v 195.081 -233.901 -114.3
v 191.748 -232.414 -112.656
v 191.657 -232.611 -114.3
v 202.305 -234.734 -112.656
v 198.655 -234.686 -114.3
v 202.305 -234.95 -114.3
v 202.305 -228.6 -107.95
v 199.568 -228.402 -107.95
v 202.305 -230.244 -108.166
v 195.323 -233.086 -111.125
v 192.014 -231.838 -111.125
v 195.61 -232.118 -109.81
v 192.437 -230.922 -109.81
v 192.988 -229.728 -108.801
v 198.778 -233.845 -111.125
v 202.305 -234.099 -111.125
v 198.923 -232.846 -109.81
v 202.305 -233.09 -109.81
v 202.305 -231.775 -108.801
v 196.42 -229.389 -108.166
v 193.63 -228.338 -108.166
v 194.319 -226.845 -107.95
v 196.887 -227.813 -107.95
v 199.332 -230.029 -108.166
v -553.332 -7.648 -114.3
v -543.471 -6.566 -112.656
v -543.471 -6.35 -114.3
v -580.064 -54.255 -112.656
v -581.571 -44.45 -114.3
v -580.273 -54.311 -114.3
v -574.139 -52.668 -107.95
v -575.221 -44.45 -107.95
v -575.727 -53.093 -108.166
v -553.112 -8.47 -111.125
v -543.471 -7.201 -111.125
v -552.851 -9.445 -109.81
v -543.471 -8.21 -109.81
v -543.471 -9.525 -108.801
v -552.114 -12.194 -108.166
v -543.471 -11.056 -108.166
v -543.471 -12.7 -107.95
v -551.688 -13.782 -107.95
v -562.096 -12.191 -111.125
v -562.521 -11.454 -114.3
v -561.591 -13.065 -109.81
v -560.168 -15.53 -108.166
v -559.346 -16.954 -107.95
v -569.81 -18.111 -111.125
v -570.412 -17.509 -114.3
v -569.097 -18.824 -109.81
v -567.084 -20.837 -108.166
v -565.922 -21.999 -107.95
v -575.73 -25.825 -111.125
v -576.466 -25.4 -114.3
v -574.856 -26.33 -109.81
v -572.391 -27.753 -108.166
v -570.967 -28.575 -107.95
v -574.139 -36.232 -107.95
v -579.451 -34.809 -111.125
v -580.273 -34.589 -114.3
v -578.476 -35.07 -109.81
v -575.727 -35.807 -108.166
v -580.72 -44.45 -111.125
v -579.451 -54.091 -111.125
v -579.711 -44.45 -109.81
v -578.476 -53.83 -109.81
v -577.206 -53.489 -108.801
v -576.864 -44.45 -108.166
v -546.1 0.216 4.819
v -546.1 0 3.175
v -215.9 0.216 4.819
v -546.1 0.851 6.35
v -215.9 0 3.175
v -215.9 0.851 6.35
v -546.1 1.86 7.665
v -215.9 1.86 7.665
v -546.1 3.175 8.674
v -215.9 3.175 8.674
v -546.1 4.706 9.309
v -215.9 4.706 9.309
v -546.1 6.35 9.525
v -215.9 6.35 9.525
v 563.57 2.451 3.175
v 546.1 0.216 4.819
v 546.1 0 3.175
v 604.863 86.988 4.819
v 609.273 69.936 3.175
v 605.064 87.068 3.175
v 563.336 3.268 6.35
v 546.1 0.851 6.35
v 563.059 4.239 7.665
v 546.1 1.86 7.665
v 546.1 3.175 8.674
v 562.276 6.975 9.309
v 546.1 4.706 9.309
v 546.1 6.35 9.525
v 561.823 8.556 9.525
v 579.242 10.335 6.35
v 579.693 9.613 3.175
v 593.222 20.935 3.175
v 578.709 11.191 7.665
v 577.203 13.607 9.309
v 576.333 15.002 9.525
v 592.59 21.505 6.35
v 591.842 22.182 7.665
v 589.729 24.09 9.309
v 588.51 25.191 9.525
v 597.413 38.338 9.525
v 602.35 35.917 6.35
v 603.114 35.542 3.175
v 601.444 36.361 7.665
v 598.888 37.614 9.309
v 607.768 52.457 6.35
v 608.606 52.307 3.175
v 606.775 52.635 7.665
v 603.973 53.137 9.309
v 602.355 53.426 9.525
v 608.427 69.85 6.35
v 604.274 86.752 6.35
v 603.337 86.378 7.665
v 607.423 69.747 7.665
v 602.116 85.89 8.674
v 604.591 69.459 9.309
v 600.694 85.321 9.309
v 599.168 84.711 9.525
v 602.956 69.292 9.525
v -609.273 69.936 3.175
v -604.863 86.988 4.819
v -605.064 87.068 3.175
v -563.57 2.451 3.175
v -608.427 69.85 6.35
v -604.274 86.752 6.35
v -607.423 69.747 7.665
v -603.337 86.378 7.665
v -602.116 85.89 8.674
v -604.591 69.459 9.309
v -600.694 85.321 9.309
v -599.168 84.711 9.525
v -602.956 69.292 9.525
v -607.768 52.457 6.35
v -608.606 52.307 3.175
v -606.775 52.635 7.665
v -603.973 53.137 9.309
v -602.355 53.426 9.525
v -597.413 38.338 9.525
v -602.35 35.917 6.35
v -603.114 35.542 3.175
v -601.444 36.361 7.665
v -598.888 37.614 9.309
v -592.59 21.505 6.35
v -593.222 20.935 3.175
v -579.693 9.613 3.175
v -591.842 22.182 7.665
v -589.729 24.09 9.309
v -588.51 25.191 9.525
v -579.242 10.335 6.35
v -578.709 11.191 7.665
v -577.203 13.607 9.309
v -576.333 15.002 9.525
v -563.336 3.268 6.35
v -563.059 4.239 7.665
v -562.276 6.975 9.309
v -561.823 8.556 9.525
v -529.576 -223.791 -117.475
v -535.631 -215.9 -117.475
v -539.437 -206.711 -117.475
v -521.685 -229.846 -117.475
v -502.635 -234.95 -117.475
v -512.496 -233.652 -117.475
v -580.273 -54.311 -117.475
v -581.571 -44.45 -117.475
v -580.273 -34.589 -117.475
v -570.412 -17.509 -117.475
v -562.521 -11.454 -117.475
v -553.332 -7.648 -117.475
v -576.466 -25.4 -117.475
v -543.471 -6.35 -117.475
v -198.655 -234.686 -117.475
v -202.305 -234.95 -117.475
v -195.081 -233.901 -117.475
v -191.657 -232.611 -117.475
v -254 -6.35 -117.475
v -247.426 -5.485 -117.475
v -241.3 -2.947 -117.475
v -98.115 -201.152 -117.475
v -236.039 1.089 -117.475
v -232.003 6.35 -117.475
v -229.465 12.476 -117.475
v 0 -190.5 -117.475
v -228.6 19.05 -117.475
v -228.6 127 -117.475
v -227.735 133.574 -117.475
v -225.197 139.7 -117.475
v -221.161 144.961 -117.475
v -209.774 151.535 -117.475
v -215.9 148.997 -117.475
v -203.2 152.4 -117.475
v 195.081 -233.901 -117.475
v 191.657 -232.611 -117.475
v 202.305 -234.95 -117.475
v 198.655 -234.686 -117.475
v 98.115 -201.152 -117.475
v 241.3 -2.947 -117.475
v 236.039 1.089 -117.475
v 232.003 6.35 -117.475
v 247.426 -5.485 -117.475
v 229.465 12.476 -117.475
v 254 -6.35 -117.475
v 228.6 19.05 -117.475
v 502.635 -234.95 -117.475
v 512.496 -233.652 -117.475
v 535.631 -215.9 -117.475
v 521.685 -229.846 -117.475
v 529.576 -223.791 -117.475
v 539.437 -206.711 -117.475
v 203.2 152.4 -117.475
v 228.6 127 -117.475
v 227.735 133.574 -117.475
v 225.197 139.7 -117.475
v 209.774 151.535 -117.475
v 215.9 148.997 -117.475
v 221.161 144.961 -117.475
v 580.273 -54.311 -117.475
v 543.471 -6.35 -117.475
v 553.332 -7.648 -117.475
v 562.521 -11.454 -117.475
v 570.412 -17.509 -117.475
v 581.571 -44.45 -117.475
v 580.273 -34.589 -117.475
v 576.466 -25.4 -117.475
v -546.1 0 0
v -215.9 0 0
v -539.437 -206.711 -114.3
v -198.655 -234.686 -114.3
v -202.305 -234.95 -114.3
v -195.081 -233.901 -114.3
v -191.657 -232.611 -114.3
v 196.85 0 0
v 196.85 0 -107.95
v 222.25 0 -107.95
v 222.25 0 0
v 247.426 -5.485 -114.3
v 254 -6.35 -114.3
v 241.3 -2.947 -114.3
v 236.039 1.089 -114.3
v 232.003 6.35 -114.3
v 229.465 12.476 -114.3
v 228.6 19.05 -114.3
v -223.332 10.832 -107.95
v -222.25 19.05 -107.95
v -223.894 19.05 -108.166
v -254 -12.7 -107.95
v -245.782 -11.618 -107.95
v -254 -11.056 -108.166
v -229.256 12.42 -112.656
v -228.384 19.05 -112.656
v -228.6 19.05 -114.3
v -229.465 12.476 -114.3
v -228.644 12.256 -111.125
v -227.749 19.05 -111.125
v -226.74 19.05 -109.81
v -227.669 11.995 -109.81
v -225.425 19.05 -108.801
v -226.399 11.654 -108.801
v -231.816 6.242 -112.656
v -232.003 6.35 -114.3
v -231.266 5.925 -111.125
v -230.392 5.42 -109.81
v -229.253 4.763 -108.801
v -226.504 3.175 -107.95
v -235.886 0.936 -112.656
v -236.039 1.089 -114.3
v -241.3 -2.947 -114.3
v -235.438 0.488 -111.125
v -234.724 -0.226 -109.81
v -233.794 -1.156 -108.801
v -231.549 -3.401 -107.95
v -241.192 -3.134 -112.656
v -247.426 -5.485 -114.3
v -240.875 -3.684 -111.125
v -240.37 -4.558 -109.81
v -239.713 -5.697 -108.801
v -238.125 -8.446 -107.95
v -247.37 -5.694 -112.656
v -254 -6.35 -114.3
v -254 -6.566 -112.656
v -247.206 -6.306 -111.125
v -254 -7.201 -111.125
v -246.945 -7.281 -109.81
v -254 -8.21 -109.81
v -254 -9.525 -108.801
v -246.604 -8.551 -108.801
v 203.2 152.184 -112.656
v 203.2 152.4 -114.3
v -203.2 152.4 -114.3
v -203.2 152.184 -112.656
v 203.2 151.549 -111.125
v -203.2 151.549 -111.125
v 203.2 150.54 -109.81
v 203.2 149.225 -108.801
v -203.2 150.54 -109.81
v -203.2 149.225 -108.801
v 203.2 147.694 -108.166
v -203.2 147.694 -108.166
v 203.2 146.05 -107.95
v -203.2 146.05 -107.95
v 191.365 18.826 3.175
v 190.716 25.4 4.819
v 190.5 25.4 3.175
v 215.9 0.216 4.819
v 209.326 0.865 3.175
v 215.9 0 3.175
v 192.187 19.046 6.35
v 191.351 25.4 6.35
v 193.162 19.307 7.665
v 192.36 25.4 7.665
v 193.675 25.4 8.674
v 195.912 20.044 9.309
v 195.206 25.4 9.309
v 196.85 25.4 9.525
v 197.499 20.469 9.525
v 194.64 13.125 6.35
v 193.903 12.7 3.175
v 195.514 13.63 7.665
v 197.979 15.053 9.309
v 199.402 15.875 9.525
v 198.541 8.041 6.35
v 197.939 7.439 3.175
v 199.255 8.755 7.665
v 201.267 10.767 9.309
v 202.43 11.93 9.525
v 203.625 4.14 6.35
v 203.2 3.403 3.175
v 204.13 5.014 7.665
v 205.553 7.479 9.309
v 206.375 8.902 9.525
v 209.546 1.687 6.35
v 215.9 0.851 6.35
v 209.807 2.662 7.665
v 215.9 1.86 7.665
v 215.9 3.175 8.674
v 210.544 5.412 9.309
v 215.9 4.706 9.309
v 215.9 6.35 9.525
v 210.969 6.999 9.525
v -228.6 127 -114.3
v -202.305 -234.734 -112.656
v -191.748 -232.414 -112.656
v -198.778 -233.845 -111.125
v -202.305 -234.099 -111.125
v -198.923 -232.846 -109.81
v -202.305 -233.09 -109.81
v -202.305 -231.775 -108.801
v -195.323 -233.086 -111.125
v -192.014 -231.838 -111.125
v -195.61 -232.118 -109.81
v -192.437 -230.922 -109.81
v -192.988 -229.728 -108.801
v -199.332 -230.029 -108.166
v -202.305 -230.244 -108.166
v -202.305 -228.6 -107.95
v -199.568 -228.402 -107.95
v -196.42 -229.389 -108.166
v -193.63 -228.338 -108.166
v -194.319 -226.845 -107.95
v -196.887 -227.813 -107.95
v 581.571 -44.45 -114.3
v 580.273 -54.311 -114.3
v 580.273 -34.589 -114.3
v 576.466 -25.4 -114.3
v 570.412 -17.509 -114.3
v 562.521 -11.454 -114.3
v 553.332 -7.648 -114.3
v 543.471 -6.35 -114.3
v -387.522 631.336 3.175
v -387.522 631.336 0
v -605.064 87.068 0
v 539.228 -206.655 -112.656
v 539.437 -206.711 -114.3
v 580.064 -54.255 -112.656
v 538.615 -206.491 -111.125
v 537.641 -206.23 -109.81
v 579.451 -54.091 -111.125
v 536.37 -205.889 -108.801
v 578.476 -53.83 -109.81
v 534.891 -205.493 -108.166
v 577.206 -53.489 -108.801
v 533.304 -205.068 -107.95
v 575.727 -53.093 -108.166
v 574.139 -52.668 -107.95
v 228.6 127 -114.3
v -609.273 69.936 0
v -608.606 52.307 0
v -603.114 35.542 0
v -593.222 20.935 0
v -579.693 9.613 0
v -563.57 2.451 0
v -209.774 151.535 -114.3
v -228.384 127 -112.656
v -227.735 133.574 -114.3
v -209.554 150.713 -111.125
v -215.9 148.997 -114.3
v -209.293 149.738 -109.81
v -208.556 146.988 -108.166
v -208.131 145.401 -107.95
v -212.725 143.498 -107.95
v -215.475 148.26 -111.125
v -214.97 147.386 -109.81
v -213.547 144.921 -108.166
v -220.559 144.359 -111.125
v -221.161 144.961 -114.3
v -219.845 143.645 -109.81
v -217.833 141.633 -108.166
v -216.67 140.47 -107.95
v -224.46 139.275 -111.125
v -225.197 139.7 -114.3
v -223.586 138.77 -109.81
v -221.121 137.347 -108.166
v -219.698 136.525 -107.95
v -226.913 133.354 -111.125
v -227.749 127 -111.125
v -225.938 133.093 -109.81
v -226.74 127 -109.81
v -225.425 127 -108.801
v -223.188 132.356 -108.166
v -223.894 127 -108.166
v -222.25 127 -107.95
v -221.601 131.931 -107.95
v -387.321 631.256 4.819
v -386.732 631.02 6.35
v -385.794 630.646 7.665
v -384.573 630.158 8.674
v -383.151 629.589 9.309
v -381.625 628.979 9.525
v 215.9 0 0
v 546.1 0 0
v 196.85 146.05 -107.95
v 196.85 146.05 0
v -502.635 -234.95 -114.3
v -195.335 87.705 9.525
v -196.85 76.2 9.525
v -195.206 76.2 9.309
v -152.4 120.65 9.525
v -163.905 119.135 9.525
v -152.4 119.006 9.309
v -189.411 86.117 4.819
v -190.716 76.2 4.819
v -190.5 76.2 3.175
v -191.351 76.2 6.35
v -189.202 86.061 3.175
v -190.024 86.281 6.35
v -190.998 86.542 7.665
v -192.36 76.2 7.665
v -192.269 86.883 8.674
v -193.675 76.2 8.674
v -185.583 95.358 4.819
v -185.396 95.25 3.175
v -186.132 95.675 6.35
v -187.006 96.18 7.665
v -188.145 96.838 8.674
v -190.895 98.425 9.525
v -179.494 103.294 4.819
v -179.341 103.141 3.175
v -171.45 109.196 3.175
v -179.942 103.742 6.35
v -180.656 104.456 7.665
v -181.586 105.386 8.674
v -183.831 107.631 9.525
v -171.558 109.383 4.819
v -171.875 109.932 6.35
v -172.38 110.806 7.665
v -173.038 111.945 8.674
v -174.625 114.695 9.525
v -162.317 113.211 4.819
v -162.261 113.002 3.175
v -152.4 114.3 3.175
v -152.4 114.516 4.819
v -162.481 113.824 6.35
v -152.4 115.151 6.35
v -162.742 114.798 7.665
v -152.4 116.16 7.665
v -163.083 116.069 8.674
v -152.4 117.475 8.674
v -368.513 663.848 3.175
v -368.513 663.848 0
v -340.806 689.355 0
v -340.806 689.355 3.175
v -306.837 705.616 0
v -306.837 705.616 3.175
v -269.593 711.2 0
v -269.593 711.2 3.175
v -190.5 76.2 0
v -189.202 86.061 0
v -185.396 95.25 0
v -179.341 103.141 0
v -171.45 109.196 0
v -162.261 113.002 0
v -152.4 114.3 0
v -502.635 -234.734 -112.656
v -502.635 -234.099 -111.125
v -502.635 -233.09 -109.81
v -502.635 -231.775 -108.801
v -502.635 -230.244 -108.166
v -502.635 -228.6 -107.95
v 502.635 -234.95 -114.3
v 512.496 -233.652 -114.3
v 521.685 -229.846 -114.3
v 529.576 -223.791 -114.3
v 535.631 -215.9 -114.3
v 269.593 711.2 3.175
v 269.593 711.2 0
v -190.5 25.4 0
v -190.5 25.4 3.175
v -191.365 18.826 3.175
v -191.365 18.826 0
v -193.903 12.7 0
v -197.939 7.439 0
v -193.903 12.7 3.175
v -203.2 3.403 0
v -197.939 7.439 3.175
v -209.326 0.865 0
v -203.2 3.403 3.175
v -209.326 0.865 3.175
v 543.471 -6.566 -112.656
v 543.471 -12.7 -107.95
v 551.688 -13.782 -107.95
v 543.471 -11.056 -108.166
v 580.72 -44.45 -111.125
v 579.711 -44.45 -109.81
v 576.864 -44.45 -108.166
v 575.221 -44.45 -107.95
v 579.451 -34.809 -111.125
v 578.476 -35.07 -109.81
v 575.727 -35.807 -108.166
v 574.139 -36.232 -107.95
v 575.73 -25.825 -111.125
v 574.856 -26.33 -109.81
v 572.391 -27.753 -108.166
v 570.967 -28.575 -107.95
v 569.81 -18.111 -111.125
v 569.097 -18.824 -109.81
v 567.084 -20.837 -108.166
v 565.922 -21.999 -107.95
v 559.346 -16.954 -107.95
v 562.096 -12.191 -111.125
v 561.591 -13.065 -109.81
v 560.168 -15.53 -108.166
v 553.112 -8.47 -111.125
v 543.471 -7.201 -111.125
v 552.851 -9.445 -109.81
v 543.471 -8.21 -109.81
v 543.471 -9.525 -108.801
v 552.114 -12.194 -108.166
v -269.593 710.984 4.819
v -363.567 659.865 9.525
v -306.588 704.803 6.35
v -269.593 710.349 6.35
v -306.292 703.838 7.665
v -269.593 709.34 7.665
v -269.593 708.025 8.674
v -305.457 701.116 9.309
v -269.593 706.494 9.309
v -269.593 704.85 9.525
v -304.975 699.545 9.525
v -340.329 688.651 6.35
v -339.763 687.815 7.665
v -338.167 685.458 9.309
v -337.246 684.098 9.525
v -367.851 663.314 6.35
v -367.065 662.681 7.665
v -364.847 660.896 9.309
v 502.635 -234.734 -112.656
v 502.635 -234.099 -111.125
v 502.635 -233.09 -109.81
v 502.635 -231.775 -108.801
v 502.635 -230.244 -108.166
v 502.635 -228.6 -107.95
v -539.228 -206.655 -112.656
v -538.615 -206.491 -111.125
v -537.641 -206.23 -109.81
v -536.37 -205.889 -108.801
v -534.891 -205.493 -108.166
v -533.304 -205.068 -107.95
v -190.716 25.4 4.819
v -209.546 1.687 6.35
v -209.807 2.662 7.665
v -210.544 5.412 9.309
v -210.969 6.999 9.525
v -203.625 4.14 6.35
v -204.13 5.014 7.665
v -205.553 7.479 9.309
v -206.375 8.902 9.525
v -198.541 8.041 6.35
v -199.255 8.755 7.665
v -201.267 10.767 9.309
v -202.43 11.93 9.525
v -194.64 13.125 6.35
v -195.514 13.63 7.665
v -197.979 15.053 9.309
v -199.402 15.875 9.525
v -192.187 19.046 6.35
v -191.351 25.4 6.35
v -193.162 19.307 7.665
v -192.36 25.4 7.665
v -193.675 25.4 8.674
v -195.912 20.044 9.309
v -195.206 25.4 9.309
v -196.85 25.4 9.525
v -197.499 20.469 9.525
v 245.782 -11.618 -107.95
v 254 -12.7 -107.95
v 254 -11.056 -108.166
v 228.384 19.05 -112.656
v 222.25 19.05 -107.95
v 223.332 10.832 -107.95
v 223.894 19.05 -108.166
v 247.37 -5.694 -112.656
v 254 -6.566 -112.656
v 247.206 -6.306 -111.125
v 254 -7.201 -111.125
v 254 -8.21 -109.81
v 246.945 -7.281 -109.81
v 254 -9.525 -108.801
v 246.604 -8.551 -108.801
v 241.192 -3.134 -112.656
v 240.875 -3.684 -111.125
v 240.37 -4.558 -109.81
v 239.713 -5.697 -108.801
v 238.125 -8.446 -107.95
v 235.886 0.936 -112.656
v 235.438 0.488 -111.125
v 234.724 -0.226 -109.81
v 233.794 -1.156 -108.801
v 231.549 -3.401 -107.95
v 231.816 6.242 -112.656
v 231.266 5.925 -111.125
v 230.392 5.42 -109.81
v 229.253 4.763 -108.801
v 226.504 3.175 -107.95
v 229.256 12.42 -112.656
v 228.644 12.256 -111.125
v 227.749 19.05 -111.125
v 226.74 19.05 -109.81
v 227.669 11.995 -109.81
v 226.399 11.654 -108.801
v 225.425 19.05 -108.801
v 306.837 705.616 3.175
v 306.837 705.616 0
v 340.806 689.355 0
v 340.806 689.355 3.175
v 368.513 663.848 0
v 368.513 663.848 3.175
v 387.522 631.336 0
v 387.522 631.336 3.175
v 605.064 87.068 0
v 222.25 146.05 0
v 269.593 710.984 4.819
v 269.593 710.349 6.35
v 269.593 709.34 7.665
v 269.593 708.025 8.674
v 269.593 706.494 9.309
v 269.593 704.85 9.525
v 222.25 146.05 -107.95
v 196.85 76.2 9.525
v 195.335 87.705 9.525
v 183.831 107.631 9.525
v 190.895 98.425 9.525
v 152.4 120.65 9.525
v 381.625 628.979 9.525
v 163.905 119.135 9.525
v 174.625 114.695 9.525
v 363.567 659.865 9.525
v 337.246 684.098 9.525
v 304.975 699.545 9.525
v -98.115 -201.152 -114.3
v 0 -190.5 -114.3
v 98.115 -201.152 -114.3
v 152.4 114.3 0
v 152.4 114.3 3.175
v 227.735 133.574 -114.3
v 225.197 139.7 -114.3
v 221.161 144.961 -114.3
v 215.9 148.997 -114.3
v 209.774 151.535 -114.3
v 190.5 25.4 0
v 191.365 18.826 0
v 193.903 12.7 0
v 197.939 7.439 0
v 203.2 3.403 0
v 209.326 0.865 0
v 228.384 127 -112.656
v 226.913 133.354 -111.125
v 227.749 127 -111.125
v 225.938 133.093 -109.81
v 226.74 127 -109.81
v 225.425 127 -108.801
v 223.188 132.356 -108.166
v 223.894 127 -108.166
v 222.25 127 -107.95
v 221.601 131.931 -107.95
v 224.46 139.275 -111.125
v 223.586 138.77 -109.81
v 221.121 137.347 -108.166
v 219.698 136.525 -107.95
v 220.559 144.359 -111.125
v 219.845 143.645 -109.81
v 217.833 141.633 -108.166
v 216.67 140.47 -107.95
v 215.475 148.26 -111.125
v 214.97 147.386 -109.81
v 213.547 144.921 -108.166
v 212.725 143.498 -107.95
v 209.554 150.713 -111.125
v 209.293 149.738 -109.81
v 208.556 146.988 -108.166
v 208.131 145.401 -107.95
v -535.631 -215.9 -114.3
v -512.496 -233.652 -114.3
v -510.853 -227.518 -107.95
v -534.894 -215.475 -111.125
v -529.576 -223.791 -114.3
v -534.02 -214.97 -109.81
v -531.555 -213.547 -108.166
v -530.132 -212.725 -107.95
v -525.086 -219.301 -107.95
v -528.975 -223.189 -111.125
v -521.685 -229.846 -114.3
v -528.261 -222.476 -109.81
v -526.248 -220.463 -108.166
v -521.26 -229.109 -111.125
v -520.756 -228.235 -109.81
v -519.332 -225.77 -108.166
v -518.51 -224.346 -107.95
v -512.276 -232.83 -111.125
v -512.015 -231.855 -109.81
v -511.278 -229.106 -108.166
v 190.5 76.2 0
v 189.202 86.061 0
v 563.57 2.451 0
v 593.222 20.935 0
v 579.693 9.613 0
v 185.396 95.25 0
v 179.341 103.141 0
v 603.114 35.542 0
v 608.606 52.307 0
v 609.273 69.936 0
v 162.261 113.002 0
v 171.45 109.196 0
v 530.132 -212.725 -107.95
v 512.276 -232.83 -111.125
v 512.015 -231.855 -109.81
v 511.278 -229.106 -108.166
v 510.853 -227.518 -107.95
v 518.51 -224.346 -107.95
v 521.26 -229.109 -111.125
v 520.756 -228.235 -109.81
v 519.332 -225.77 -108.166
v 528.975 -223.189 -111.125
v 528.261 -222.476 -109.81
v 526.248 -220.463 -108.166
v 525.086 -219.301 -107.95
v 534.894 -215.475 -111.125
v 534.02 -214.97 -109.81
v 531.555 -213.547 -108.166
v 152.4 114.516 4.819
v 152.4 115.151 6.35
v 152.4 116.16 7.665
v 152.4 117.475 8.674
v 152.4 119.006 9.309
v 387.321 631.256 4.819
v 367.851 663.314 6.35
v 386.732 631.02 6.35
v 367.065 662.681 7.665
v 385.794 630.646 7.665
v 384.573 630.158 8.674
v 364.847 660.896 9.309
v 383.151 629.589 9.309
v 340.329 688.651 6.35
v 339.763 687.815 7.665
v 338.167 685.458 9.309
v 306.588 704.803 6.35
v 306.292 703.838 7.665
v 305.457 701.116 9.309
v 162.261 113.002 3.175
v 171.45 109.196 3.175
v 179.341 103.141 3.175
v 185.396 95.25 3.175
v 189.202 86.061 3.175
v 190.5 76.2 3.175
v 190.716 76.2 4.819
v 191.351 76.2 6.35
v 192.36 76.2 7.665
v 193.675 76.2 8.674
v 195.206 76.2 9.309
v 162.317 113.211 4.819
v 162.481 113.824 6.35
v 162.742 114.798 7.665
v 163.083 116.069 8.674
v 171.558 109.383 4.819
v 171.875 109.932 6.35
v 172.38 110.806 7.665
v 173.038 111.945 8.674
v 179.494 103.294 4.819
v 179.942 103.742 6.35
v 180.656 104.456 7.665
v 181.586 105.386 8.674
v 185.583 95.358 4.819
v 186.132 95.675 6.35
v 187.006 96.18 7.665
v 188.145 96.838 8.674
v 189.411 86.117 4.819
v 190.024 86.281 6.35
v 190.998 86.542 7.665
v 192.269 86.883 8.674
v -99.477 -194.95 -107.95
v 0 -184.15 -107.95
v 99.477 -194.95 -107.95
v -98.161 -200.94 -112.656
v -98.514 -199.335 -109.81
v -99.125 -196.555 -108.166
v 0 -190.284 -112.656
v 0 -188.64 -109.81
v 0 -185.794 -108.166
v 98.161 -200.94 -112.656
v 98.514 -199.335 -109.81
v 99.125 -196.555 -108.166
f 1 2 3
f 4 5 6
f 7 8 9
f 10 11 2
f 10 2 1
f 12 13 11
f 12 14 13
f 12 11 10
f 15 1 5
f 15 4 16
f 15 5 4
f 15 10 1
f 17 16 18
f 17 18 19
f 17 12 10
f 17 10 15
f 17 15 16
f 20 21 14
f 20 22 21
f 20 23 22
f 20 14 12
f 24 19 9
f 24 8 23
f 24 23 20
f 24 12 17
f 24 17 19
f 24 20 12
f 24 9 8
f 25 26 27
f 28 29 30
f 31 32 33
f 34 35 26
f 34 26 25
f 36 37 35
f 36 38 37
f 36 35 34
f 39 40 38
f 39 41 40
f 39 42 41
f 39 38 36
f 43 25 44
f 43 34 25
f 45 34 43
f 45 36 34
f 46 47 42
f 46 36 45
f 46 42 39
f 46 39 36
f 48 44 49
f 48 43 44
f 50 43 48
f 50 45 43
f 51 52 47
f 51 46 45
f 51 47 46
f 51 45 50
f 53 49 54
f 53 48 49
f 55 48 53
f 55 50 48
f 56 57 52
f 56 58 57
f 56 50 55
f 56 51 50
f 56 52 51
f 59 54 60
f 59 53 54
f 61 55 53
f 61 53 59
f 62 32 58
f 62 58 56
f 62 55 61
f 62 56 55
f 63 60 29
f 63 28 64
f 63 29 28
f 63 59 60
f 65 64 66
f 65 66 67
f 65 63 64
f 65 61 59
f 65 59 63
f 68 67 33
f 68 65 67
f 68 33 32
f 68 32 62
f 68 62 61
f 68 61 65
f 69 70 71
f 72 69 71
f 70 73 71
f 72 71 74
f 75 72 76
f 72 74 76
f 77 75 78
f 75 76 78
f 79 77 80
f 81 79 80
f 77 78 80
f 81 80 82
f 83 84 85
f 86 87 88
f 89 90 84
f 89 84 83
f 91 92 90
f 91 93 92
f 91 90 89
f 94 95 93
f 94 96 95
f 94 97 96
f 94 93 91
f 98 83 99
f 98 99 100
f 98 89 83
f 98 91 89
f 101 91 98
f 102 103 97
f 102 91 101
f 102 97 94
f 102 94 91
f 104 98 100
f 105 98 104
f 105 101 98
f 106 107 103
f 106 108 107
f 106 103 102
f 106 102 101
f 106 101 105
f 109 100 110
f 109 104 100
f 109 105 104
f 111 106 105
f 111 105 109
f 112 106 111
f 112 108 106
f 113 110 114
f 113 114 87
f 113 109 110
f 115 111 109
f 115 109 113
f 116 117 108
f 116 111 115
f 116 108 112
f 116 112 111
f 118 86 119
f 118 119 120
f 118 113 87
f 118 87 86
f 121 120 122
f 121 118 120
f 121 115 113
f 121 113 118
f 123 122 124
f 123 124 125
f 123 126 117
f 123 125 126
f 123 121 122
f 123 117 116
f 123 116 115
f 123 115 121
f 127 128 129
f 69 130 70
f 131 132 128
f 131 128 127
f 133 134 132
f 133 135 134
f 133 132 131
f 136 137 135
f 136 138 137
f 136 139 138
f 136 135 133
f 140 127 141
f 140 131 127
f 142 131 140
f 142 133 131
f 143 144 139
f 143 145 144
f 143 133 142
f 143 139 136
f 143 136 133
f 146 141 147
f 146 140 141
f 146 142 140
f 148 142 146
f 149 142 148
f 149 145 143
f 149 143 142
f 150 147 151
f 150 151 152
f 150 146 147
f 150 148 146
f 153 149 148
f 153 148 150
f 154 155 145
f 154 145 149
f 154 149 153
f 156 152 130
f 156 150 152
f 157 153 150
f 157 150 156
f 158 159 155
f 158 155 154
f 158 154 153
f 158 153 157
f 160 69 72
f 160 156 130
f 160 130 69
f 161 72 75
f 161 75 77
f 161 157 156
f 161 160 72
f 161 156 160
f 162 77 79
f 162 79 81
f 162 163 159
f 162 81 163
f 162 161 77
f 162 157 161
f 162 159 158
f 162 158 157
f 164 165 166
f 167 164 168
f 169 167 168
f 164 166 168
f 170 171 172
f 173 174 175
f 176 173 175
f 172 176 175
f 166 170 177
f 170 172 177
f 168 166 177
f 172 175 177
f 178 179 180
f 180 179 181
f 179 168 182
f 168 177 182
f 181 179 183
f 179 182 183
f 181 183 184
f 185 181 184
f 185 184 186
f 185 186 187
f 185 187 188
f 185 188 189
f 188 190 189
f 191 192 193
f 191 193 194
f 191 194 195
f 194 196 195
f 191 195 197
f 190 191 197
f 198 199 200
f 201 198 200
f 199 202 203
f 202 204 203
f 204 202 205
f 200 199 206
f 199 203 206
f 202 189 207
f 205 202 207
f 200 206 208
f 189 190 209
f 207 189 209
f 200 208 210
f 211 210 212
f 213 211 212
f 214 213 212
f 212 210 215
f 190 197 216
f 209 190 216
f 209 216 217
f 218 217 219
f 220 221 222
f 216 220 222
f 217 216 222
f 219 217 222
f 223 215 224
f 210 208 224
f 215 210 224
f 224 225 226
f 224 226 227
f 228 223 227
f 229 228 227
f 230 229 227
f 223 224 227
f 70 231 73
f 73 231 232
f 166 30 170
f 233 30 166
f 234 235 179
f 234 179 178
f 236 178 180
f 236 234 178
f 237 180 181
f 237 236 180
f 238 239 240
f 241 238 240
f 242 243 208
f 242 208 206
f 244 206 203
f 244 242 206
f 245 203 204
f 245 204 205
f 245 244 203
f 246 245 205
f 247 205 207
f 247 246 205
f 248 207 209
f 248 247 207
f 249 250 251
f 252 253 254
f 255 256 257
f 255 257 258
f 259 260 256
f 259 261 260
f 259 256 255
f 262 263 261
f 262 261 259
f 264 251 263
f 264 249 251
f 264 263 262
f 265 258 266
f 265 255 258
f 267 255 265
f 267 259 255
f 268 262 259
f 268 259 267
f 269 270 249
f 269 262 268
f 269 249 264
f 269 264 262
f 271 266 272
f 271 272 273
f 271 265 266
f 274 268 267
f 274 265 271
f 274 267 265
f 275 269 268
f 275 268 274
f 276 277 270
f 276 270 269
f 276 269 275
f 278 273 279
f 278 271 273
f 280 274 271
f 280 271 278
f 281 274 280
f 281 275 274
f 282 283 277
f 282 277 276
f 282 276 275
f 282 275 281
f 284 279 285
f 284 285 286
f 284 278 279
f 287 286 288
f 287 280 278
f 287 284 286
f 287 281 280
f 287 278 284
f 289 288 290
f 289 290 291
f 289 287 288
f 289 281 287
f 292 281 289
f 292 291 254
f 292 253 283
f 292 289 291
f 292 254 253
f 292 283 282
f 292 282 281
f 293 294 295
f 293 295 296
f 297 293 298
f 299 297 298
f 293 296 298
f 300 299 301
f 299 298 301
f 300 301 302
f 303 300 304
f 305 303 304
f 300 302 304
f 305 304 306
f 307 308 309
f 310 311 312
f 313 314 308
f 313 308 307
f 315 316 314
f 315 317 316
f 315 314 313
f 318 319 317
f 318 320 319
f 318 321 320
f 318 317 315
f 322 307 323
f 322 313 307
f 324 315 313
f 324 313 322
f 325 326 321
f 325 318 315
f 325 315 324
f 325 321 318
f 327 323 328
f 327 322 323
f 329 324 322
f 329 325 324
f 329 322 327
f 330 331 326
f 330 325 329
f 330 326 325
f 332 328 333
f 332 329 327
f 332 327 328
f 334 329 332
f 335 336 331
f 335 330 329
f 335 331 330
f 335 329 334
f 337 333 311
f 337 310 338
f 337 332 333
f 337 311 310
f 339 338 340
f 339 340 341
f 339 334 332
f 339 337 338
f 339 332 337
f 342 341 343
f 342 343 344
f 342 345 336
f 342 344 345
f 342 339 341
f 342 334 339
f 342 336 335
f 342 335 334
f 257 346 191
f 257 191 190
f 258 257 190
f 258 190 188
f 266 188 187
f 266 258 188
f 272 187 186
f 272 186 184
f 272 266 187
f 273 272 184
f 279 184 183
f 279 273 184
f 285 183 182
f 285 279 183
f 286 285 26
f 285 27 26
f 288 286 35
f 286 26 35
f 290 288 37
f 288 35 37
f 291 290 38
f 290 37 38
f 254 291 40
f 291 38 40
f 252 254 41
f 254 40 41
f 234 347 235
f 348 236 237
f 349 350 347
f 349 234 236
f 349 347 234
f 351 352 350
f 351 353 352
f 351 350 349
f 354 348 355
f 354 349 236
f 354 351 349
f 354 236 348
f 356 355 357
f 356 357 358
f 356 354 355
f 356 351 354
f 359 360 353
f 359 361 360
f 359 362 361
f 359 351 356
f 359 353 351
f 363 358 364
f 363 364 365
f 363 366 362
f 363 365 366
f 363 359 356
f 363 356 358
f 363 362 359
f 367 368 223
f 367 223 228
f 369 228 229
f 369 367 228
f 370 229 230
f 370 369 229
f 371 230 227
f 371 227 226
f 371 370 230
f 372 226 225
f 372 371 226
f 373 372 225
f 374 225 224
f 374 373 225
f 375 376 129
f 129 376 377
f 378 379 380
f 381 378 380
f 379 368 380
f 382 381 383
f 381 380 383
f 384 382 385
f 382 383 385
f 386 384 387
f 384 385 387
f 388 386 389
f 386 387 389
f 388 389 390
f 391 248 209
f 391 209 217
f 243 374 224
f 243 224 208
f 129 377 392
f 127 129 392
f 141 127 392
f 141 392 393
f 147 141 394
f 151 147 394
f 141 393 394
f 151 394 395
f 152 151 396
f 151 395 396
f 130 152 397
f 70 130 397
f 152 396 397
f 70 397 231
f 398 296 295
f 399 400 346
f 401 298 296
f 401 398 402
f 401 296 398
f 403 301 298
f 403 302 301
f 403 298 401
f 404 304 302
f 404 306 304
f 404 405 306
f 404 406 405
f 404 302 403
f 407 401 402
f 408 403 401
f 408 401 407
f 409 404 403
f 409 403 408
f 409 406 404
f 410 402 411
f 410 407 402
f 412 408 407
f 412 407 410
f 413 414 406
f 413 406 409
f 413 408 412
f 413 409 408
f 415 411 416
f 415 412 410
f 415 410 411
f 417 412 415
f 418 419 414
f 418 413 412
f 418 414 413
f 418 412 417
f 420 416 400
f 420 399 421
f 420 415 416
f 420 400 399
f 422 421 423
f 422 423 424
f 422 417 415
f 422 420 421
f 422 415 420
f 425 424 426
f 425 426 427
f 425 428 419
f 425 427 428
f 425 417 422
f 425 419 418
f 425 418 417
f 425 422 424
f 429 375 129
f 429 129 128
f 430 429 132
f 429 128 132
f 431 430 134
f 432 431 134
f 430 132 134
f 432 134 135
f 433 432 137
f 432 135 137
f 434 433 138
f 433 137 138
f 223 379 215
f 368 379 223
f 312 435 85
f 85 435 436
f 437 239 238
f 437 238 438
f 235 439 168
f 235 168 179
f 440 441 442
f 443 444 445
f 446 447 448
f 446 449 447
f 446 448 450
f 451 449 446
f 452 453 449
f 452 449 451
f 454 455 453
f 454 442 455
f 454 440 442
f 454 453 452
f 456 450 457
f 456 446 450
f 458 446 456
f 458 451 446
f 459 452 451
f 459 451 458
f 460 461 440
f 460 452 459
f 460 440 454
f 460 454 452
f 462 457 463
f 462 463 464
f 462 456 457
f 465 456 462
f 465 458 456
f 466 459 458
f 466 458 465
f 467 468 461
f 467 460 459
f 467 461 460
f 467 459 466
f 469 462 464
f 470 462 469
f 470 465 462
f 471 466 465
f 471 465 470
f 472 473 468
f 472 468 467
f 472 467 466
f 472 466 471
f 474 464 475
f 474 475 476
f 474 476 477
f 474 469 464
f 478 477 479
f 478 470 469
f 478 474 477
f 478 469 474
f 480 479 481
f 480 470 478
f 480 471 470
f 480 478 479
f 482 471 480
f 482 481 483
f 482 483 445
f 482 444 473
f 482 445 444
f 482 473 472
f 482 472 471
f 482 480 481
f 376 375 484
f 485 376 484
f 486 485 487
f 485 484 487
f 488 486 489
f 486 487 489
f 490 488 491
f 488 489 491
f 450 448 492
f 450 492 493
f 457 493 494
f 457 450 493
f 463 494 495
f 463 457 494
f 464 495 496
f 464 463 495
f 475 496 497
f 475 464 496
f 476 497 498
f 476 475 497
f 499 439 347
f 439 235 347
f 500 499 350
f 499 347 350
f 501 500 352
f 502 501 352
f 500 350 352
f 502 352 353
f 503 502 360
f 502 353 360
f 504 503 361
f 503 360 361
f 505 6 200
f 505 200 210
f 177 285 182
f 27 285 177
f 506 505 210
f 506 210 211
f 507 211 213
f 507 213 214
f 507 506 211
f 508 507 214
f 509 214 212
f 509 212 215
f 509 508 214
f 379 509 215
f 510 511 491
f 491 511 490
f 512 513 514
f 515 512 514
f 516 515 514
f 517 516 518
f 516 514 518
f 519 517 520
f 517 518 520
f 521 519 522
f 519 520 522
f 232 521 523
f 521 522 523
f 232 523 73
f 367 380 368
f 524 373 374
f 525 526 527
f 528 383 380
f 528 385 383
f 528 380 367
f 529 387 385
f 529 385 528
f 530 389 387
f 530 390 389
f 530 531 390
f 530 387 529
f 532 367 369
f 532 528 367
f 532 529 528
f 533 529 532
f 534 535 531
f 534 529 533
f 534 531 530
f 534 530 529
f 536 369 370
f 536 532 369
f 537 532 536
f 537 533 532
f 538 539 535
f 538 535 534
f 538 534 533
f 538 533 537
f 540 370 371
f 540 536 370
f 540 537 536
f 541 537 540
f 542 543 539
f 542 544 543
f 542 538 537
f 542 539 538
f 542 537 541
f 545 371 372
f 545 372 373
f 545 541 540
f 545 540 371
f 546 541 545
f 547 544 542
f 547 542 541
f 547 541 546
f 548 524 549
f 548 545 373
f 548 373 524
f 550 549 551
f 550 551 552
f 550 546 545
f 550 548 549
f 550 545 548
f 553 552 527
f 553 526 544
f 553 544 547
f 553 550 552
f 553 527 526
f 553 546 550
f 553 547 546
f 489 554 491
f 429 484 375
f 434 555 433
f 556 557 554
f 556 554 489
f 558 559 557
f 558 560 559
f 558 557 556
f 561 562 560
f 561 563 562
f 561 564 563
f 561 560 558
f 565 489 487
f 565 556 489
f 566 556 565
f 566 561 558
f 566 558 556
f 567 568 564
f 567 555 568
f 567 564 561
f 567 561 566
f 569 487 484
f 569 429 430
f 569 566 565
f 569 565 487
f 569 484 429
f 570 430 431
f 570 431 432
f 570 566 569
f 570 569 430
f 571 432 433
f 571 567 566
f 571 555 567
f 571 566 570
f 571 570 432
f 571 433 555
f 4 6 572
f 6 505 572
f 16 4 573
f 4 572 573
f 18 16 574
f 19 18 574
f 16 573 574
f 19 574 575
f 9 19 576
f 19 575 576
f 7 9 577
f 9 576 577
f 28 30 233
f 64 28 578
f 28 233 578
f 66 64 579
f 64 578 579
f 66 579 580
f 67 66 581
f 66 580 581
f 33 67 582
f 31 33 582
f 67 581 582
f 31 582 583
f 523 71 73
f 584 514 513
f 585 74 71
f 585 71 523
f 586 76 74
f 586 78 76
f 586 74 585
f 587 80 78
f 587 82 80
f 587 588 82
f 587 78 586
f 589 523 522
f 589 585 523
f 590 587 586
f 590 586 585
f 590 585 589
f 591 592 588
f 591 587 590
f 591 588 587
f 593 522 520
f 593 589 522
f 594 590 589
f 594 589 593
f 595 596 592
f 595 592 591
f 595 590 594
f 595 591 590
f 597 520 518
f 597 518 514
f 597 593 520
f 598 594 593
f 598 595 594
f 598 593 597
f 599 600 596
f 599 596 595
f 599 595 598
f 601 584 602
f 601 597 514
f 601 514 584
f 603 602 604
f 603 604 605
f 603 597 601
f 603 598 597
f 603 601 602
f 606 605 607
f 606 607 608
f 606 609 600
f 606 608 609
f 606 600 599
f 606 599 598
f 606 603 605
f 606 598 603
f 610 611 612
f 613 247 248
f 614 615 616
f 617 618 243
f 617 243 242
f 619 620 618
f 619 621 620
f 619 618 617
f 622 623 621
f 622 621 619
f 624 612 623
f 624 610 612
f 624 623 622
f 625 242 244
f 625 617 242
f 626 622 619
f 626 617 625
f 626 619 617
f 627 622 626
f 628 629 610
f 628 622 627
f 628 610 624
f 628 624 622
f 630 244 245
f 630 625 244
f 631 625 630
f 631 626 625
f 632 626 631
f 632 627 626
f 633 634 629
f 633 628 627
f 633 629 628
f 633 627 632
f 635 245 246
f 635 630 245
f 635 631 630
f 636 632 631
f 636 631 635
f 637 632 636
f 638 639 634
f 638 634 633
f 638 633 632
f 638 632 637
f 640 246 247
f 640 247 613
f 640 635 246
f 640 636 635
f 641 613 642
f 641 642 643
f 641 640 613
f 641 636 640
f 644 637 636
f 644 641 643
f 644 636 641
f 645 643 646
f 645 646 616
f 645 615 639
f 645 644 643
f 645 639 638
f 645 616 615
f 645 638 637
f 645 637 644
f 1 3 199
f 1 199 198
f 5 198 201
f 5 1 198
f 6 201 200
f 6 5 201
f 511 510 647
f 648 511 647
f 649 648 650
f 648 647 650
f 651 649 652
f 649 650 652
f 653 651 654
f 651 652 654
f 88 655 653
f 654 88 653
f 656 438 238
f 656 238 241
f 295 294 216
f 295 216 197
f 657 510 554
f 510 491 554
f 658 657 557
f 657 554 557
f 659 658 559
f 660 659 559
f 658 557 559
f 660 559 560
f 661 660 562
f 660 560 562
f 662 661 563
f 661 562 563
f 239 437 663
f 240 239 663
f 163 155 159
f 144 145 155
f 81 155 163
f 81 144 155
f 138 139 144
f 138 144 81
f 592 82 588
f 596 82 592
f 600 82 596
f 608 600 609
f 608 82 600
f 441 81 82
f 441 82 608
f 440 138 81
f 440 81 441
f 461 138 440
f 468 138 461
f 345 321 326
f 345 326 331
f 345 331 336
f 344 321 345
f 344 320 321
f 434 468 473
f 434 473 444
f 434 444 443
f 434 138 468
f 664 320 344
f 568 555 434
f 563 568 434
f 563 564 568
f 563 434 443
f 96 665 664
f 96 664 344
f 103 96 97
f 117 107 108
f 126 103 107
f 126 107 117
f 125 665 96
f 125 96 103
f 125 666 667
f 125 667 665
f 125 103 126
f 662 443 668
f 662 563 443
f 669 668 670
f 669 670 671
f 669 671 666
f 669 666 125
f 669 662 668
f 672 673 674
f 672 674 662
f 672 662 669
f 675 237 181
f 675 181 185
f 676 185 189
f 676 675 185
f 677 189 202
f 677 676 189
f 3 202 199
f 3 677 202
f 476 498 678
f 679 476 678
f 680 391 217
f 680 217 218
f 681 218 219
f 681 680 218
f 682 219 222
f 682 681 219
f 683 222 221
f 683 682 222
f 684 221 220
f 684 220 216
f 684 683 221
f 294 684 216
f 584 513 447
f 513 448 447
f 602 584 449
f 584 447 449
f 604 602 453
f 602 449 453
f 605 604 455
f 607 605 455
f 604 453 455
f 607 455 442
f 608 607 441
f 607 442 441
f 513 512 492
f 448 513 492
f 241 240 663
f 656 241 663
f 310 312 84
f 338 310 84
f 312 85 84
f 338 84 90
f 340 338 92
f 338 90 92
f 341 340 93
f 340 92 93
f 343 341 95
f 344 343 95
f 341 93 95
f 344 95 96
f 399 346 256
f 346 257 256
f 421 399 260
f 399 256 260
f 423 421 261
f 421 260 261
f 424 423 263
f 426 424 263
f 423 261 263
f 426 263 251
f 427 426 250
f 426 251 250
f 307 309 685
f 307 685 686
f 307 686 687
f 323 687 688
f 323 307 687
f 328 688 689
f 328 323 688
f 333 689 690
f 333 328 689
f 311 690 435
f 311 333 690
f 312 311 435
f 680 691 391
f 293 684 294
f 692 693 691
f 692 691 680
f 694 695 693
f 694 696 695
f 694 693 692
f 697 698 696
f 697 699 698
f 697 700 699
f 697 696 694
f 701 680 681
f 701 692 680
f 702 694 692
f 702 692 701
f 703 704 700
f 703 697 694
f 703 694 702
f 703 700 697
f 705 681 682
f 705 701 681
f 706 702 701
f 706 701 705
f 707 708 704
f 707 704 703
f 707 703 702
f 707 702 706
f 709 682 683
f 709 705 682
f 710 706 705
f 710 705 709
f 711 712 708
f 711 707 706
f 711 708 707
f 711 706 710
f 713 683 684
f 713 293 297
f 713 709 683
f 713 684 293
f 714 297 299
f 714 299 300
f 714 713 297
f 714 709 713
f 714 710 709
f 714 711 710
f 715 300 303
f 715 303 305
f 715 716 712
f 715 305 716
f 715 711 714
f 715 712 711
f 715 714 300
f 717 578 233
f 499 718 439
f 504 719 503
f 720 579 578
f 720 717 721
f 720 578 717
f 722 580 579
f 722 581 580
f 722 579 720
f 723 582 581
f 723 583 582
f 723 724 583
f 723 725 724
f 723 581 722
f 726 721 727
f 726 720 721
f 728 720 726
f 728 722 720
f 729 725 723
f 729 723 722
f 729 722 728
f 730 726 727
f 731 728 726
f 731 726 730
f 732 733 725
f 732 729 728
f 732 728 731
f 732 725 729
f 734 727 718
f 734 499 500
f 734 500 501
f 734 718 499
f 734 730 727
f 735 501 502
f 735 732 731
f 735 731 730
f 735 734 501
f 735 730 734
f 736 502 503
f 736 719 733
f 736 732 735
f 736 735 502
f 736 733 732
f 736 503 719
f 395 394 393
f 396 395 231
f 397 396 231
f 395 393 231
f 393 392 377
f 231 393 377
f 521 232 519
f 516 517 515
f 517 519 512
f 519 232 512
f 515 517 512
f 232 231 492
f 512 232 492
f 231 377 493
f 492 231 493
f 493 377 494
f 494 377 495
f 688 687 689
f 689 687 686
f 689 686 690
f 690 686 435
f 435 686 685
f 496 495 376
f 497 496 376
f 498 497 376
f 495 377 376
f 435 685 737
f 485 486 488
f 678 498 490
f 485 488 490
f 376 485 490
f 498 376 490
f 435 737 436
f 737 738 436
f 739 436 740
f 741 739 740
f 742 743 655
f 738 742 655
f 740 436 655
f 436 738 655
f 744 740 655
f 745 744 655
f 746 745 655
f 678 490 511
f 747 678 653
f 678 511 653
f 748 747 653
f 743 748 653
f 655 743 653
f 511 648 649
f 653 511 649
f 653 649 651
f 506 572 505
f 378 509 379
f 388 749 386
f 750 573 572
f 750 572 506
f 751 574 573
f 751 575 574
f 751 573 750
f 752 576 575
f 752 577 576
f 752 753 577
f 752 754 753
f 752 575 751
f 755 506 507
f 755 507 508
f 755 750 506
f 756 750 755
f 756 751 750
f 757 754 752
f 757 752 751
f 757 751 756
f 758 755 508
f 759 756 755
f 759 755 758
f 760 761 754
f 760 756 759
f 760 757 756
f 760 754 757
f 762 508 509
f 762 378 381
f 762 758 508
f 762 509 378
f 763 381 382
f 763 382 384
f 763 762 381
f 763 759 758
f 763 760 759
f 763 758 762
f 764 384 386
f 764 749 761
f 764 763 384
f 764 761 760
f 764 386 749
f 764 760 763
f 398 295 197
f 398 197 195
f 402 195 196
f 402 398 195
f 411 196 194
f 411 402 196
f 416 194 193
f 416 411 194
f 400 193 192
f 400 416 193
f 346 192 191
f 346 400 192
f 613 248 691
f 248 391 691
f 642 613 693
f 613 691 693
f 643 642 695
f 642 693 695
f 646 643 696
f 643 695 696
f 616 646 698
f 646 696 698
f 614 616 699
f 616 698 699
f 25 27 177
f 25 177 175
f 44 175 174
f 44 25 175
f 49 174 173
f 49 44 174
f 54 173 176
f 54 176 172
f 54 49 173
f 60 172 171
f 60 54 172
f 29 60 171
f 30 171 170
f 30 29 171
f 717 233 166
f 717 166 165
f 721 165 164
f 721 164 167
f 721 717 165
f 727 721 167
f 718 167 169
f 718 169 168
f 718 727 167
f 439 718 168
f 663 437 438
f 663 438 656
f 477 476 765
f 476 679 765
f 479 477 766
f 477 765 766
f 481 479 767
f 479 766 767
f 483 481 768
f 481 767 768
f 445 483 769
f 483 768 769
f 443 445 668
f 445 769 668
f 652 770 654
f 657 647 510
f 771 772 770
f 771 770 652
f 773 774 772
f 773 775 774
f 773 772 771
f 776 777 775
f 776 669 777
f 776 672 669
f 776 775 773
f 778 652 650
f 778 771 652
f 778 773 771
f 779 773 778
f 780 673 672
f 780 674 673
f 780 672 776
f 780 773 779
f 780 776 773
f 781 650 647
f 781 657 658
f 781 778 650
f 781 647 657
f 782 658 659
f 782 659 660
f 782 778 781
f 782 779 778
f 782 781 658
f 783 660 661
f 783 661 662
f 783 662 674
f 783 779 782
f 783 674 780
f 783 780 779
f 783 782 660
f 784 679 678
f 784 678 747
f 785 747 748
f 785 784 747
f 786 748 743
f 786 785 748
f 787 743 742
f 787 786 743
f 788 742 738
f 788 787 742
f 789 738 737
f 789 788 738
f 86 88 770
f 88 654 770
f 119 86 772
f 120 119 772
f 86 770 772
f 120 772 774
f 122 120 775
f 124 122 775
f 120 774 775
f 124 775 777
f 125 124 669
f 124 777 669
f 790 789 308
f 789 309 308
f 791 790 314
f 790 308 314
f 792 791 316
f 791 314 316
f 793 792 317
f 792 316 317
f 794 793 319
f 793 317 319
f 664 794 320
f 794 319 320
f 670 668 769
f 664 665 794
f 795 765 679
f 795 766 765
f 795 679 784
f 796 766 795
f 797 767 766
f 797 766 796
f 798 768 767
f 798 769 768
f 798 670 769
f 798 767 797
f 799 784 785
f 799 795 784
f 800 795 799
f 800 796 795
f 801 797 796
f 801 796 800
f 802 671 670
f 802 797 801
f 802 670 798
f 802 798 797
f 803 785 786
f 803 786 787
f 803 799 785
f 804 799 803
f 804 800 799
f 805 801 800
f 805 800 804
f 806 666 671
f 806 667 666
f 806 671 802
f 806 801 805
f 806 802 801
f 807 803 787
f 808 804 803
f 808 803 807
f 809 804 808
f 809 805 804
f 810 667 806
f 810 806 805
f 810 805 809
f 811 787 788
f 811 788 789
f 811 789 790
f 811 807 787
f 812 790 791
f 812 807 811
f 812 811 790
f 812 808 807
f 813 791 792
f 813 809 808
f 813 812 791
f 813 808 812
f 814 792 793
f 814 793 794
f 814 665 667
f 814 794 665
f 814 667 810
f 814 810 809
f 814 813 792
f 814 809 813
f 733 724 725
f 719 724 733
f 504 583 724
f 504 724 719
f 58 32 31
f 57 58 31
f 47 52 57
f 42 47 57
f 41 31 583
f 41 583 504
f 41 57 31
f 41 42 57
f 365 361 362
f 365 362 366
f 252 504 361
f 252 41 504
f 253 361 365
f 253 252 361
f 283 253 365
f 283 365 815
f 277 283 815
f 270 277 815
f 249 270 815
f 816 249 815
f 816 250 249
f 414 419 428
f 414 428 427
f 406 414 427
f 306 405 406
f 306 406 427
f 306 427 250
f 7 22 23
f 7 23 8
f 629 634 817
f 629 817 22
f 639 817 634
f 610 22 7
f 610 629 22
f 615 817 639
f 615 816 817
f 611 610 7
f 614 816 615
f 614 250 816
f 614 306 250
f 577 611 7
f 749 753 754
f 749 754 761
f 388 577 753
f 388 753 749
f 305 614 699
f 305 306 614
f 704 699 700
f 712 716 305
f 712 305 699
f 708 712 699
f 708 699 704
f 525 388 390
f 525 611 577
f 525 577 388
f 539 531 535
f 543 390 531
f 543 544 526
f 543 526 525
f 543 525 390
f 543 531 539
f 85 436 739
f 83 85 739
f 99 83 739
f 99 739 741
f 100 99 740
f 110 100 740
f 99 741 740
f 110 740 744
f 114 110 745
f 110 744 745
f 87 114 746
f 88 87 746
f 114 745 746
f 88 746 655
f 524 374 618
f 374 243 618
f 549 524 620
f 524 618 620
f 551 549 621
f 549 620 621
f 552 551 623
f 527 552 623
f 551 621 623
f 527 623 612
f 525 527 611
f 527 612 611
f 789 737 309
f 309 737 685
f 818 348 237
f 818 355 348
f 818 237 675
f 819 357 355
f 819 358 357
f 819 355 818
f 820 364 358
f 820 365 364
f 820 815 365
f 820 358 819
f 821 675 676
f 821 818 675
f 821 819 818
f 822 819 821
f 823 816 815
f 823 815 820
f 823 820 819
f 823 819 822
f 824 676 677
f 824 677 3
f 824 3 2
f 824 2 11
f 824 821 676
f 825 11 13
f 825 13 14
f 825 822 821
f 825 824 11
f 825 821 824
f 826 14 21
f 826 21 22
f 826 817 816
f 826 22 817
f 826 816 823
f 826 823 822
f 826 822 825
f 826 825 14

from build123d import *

# Parameters (mm, degrees)
F3_DEPTH  = 9.525
F4_R      = 38.1
F5_R      = 25.4
F6_R      = 127
F7_R      = 6.35
F8_DEPTH  = 9.525
F9_R      = 6.35
F10_W     = 25.4
F10_H     = 146.05
F11_DEPTH = 107.95


with BuildPart() as f3:
    # F0 (on Top) → F3 (new body)
    with BuildSketch(Plane.XY):
        with BuildLine():
            Line((-190.5, 0), (-190.5, 114.3))
            Line((-190.5, 114.3), (190.5, 114.3))
            Line((190.5, 114.3), (190.5, 0))
            Line((190.5, 0), (546.1, 0))
            ThreePointArc((546.1, 0), (598.677636, 27.893228), (605.064406, 87.067962))
            Line((605.064406, 87.067962), (355.6, 711.2))
            Line((355.6, 711.2), (-355.6, 711.2))
            Line((-355.6, 711.2), (-605.064406, 87.067962))
            ThreePointArc((-605.064406, 87.067962), (-598.677636, 27.893228), (-546.1, 0))
            Line((-546.1, 0), (-190.5, 0))
        make_face()
    extrude(amount=F3_DEPTH)

    # F4
    f4_edges = [f3.edges().sort_by_distance(p)[0] for p in [
        (-190.5, 114.3, 4.7625),
        (190.5, 114.3, 4.7625),
    ]]
    fillet(f4_edges, radius=F4_R)

    # F5
    f5_edges = [f3.edges().sort_by_distance(p)[0] for p in [
        (-190.5, 0, 4.7625),
        (190.5, 0, 4.7625),
    ]]
    fillet(f5_edges, radius=F5_R)

    # F6
    f6_edges = [f3.edges().sort_by_distance(p)[0] for p in [
        (355.6, 711.2, 4.7625),
        (-355.6, 711.2, 4.7625),
    ]]
    fillet(f6_edges, radius=F6_R)

    # F7
    f7_edges = [f3.edges().sort_by_distance(p)[0] for p in [
        (-496.292963, 359.201944, 9.525),
        (-340.806253, 689.355272, 9.525),
        (-598.677636, 27.893228, 9.525),
        (0, 711.2, 9.525),
        (-381, 0, 9.525),
        (340.806253, 689.355272, 9.525),
        (-197.939488, 7.439488, 9.525),
        (496.292963, 359.201944, 9.525),
        (-190.5, 50.8, 9.525),
        (598.677636, 27.893228, 9.525),
        (-179.340768, 103.140768, 9.525),
        (381, 0, 9.525),
        (0, 114.3, 9.525),
        (197.939488, 7.439488, 9.525),
        (179.340768, 103.140768, 9.525),
        (190.5, 50.8, 9.525),
    ]]
    fillet(f7_edges, radius=F7_R)


with BuildPart() as f8:
    # F2 (on offset) → F8 (new body)
    with BuildSketch(Plane.XY.offset(-107.95)):
        with BuildLine():
            Line((-254, -6.35), (-543.4709, -6.35))
            ThreePointArc((-543.4709, -6.35), (-573.697662, -21.25619), (-580.272674, -54.311006))
            Line((-580.272674, -54.311006), (-539.437217, -206.711006))
            ThreePointArc((-539.437217, -206.711006), (-525.829253, -227.076762), (-502.635443, -234.95))
            Line((-502.635443, -234.95), (-202.30506, -234.95))
            ThreePointArc((-202.30506, -234.95), (-196.854252, -234.358238), (-191.657426, -232.610526))
            ThreePointArc((-191.657426, -232.610526), (0, -190.5), (191.657426, -232.610526))
            ThreePointArc((191.657426, -232.610526), (196.854252, -234.358238), (202.30506, -234.95))
            Line((202.30506, -234.95), (502.635443, -234.95))
            ThreePointArc((502.635443, -234.95), (525.829253, -227.076762), (539.437217, -206.711006))
            Line((539.437217, -206.711006), (580.272674, -54.311006))
            ThreePointArc((580.272674, -54.311006), (573.697662, -21.25619), (543.4709, -6.35))
            Line((543.4709, -6.35), (254, -6.35))
            ThreePointArc((254, -6.35), (236.039488, 1.089488), (228.6, 19.05))
            Line((228.6, 19.05), (228.6, 127))
            ThreePointArc((228.6, 127), (221.160512, 144.960512), (203.2, 152.4))
            Line((203.2, 152.4), (-203.2, 152.4))
            ThreePointArc((-203.2, 152.4), (-221.160512, 144.960512), (-228.6, 127))
            Line((-228.6, 127), (-228.6, 19.05))
            ThreePointArc((-228.6, 19.05), (-236.039488, 1.089488), (-254, -6.35))
        make_face()
    extrude(amount=-F8_DEPTH)

    # F9
    f9_edges = [f8.edges().sort_by_distance(p)[0] for p in [
        (196.854252, -234.358238, -107.95),
        (352.470252, -234.95, -107.95),
        (525.829253, -227.076762, -107.95),
        (559.854945, -130.511006, -107.95),
        (573.697662, -21.25619, -107.95),
        (398.73545, -6.35, -107.95),
        (236.039488, 1.089488, -107.95),
        (228.6, 73.025, -107.95),
        (221.160512, 144.960512, -107.95),
        (0, 152.4, -107.95),
        (-221.160512, 144.960512, -107.95),
        (-228.6, 73.025, -107.95),
        (-236.039488, 1.089488, -107.95),
        (-398.73545, -6.35, -107.95),
        (-573.697662, -21.25619, -107.95),
        (-559.854945, -130.511006, -107.95),
        (-525.829253, -227.076762, -107.95),
        (-352.470252, -234.95, -107.95),
        (-196.854252, -234.358238, -107.95),
        (0, -190.5, -107.95),
    ]]
    fillet(f9_edges, radius=F9_R)


with BuildPart() as f11:
    # F10 (on face) → F11 (new body, through all)
    with BuildSketch(Plane.XY.offset(-107.95)):
        with Locations((209.55, 73.025)):
            Rectangle(F10_W, F10_H)
    extrude(amount=F11_DEPTH)


solid = Compound([f3.part, f8.part, f11.part])
